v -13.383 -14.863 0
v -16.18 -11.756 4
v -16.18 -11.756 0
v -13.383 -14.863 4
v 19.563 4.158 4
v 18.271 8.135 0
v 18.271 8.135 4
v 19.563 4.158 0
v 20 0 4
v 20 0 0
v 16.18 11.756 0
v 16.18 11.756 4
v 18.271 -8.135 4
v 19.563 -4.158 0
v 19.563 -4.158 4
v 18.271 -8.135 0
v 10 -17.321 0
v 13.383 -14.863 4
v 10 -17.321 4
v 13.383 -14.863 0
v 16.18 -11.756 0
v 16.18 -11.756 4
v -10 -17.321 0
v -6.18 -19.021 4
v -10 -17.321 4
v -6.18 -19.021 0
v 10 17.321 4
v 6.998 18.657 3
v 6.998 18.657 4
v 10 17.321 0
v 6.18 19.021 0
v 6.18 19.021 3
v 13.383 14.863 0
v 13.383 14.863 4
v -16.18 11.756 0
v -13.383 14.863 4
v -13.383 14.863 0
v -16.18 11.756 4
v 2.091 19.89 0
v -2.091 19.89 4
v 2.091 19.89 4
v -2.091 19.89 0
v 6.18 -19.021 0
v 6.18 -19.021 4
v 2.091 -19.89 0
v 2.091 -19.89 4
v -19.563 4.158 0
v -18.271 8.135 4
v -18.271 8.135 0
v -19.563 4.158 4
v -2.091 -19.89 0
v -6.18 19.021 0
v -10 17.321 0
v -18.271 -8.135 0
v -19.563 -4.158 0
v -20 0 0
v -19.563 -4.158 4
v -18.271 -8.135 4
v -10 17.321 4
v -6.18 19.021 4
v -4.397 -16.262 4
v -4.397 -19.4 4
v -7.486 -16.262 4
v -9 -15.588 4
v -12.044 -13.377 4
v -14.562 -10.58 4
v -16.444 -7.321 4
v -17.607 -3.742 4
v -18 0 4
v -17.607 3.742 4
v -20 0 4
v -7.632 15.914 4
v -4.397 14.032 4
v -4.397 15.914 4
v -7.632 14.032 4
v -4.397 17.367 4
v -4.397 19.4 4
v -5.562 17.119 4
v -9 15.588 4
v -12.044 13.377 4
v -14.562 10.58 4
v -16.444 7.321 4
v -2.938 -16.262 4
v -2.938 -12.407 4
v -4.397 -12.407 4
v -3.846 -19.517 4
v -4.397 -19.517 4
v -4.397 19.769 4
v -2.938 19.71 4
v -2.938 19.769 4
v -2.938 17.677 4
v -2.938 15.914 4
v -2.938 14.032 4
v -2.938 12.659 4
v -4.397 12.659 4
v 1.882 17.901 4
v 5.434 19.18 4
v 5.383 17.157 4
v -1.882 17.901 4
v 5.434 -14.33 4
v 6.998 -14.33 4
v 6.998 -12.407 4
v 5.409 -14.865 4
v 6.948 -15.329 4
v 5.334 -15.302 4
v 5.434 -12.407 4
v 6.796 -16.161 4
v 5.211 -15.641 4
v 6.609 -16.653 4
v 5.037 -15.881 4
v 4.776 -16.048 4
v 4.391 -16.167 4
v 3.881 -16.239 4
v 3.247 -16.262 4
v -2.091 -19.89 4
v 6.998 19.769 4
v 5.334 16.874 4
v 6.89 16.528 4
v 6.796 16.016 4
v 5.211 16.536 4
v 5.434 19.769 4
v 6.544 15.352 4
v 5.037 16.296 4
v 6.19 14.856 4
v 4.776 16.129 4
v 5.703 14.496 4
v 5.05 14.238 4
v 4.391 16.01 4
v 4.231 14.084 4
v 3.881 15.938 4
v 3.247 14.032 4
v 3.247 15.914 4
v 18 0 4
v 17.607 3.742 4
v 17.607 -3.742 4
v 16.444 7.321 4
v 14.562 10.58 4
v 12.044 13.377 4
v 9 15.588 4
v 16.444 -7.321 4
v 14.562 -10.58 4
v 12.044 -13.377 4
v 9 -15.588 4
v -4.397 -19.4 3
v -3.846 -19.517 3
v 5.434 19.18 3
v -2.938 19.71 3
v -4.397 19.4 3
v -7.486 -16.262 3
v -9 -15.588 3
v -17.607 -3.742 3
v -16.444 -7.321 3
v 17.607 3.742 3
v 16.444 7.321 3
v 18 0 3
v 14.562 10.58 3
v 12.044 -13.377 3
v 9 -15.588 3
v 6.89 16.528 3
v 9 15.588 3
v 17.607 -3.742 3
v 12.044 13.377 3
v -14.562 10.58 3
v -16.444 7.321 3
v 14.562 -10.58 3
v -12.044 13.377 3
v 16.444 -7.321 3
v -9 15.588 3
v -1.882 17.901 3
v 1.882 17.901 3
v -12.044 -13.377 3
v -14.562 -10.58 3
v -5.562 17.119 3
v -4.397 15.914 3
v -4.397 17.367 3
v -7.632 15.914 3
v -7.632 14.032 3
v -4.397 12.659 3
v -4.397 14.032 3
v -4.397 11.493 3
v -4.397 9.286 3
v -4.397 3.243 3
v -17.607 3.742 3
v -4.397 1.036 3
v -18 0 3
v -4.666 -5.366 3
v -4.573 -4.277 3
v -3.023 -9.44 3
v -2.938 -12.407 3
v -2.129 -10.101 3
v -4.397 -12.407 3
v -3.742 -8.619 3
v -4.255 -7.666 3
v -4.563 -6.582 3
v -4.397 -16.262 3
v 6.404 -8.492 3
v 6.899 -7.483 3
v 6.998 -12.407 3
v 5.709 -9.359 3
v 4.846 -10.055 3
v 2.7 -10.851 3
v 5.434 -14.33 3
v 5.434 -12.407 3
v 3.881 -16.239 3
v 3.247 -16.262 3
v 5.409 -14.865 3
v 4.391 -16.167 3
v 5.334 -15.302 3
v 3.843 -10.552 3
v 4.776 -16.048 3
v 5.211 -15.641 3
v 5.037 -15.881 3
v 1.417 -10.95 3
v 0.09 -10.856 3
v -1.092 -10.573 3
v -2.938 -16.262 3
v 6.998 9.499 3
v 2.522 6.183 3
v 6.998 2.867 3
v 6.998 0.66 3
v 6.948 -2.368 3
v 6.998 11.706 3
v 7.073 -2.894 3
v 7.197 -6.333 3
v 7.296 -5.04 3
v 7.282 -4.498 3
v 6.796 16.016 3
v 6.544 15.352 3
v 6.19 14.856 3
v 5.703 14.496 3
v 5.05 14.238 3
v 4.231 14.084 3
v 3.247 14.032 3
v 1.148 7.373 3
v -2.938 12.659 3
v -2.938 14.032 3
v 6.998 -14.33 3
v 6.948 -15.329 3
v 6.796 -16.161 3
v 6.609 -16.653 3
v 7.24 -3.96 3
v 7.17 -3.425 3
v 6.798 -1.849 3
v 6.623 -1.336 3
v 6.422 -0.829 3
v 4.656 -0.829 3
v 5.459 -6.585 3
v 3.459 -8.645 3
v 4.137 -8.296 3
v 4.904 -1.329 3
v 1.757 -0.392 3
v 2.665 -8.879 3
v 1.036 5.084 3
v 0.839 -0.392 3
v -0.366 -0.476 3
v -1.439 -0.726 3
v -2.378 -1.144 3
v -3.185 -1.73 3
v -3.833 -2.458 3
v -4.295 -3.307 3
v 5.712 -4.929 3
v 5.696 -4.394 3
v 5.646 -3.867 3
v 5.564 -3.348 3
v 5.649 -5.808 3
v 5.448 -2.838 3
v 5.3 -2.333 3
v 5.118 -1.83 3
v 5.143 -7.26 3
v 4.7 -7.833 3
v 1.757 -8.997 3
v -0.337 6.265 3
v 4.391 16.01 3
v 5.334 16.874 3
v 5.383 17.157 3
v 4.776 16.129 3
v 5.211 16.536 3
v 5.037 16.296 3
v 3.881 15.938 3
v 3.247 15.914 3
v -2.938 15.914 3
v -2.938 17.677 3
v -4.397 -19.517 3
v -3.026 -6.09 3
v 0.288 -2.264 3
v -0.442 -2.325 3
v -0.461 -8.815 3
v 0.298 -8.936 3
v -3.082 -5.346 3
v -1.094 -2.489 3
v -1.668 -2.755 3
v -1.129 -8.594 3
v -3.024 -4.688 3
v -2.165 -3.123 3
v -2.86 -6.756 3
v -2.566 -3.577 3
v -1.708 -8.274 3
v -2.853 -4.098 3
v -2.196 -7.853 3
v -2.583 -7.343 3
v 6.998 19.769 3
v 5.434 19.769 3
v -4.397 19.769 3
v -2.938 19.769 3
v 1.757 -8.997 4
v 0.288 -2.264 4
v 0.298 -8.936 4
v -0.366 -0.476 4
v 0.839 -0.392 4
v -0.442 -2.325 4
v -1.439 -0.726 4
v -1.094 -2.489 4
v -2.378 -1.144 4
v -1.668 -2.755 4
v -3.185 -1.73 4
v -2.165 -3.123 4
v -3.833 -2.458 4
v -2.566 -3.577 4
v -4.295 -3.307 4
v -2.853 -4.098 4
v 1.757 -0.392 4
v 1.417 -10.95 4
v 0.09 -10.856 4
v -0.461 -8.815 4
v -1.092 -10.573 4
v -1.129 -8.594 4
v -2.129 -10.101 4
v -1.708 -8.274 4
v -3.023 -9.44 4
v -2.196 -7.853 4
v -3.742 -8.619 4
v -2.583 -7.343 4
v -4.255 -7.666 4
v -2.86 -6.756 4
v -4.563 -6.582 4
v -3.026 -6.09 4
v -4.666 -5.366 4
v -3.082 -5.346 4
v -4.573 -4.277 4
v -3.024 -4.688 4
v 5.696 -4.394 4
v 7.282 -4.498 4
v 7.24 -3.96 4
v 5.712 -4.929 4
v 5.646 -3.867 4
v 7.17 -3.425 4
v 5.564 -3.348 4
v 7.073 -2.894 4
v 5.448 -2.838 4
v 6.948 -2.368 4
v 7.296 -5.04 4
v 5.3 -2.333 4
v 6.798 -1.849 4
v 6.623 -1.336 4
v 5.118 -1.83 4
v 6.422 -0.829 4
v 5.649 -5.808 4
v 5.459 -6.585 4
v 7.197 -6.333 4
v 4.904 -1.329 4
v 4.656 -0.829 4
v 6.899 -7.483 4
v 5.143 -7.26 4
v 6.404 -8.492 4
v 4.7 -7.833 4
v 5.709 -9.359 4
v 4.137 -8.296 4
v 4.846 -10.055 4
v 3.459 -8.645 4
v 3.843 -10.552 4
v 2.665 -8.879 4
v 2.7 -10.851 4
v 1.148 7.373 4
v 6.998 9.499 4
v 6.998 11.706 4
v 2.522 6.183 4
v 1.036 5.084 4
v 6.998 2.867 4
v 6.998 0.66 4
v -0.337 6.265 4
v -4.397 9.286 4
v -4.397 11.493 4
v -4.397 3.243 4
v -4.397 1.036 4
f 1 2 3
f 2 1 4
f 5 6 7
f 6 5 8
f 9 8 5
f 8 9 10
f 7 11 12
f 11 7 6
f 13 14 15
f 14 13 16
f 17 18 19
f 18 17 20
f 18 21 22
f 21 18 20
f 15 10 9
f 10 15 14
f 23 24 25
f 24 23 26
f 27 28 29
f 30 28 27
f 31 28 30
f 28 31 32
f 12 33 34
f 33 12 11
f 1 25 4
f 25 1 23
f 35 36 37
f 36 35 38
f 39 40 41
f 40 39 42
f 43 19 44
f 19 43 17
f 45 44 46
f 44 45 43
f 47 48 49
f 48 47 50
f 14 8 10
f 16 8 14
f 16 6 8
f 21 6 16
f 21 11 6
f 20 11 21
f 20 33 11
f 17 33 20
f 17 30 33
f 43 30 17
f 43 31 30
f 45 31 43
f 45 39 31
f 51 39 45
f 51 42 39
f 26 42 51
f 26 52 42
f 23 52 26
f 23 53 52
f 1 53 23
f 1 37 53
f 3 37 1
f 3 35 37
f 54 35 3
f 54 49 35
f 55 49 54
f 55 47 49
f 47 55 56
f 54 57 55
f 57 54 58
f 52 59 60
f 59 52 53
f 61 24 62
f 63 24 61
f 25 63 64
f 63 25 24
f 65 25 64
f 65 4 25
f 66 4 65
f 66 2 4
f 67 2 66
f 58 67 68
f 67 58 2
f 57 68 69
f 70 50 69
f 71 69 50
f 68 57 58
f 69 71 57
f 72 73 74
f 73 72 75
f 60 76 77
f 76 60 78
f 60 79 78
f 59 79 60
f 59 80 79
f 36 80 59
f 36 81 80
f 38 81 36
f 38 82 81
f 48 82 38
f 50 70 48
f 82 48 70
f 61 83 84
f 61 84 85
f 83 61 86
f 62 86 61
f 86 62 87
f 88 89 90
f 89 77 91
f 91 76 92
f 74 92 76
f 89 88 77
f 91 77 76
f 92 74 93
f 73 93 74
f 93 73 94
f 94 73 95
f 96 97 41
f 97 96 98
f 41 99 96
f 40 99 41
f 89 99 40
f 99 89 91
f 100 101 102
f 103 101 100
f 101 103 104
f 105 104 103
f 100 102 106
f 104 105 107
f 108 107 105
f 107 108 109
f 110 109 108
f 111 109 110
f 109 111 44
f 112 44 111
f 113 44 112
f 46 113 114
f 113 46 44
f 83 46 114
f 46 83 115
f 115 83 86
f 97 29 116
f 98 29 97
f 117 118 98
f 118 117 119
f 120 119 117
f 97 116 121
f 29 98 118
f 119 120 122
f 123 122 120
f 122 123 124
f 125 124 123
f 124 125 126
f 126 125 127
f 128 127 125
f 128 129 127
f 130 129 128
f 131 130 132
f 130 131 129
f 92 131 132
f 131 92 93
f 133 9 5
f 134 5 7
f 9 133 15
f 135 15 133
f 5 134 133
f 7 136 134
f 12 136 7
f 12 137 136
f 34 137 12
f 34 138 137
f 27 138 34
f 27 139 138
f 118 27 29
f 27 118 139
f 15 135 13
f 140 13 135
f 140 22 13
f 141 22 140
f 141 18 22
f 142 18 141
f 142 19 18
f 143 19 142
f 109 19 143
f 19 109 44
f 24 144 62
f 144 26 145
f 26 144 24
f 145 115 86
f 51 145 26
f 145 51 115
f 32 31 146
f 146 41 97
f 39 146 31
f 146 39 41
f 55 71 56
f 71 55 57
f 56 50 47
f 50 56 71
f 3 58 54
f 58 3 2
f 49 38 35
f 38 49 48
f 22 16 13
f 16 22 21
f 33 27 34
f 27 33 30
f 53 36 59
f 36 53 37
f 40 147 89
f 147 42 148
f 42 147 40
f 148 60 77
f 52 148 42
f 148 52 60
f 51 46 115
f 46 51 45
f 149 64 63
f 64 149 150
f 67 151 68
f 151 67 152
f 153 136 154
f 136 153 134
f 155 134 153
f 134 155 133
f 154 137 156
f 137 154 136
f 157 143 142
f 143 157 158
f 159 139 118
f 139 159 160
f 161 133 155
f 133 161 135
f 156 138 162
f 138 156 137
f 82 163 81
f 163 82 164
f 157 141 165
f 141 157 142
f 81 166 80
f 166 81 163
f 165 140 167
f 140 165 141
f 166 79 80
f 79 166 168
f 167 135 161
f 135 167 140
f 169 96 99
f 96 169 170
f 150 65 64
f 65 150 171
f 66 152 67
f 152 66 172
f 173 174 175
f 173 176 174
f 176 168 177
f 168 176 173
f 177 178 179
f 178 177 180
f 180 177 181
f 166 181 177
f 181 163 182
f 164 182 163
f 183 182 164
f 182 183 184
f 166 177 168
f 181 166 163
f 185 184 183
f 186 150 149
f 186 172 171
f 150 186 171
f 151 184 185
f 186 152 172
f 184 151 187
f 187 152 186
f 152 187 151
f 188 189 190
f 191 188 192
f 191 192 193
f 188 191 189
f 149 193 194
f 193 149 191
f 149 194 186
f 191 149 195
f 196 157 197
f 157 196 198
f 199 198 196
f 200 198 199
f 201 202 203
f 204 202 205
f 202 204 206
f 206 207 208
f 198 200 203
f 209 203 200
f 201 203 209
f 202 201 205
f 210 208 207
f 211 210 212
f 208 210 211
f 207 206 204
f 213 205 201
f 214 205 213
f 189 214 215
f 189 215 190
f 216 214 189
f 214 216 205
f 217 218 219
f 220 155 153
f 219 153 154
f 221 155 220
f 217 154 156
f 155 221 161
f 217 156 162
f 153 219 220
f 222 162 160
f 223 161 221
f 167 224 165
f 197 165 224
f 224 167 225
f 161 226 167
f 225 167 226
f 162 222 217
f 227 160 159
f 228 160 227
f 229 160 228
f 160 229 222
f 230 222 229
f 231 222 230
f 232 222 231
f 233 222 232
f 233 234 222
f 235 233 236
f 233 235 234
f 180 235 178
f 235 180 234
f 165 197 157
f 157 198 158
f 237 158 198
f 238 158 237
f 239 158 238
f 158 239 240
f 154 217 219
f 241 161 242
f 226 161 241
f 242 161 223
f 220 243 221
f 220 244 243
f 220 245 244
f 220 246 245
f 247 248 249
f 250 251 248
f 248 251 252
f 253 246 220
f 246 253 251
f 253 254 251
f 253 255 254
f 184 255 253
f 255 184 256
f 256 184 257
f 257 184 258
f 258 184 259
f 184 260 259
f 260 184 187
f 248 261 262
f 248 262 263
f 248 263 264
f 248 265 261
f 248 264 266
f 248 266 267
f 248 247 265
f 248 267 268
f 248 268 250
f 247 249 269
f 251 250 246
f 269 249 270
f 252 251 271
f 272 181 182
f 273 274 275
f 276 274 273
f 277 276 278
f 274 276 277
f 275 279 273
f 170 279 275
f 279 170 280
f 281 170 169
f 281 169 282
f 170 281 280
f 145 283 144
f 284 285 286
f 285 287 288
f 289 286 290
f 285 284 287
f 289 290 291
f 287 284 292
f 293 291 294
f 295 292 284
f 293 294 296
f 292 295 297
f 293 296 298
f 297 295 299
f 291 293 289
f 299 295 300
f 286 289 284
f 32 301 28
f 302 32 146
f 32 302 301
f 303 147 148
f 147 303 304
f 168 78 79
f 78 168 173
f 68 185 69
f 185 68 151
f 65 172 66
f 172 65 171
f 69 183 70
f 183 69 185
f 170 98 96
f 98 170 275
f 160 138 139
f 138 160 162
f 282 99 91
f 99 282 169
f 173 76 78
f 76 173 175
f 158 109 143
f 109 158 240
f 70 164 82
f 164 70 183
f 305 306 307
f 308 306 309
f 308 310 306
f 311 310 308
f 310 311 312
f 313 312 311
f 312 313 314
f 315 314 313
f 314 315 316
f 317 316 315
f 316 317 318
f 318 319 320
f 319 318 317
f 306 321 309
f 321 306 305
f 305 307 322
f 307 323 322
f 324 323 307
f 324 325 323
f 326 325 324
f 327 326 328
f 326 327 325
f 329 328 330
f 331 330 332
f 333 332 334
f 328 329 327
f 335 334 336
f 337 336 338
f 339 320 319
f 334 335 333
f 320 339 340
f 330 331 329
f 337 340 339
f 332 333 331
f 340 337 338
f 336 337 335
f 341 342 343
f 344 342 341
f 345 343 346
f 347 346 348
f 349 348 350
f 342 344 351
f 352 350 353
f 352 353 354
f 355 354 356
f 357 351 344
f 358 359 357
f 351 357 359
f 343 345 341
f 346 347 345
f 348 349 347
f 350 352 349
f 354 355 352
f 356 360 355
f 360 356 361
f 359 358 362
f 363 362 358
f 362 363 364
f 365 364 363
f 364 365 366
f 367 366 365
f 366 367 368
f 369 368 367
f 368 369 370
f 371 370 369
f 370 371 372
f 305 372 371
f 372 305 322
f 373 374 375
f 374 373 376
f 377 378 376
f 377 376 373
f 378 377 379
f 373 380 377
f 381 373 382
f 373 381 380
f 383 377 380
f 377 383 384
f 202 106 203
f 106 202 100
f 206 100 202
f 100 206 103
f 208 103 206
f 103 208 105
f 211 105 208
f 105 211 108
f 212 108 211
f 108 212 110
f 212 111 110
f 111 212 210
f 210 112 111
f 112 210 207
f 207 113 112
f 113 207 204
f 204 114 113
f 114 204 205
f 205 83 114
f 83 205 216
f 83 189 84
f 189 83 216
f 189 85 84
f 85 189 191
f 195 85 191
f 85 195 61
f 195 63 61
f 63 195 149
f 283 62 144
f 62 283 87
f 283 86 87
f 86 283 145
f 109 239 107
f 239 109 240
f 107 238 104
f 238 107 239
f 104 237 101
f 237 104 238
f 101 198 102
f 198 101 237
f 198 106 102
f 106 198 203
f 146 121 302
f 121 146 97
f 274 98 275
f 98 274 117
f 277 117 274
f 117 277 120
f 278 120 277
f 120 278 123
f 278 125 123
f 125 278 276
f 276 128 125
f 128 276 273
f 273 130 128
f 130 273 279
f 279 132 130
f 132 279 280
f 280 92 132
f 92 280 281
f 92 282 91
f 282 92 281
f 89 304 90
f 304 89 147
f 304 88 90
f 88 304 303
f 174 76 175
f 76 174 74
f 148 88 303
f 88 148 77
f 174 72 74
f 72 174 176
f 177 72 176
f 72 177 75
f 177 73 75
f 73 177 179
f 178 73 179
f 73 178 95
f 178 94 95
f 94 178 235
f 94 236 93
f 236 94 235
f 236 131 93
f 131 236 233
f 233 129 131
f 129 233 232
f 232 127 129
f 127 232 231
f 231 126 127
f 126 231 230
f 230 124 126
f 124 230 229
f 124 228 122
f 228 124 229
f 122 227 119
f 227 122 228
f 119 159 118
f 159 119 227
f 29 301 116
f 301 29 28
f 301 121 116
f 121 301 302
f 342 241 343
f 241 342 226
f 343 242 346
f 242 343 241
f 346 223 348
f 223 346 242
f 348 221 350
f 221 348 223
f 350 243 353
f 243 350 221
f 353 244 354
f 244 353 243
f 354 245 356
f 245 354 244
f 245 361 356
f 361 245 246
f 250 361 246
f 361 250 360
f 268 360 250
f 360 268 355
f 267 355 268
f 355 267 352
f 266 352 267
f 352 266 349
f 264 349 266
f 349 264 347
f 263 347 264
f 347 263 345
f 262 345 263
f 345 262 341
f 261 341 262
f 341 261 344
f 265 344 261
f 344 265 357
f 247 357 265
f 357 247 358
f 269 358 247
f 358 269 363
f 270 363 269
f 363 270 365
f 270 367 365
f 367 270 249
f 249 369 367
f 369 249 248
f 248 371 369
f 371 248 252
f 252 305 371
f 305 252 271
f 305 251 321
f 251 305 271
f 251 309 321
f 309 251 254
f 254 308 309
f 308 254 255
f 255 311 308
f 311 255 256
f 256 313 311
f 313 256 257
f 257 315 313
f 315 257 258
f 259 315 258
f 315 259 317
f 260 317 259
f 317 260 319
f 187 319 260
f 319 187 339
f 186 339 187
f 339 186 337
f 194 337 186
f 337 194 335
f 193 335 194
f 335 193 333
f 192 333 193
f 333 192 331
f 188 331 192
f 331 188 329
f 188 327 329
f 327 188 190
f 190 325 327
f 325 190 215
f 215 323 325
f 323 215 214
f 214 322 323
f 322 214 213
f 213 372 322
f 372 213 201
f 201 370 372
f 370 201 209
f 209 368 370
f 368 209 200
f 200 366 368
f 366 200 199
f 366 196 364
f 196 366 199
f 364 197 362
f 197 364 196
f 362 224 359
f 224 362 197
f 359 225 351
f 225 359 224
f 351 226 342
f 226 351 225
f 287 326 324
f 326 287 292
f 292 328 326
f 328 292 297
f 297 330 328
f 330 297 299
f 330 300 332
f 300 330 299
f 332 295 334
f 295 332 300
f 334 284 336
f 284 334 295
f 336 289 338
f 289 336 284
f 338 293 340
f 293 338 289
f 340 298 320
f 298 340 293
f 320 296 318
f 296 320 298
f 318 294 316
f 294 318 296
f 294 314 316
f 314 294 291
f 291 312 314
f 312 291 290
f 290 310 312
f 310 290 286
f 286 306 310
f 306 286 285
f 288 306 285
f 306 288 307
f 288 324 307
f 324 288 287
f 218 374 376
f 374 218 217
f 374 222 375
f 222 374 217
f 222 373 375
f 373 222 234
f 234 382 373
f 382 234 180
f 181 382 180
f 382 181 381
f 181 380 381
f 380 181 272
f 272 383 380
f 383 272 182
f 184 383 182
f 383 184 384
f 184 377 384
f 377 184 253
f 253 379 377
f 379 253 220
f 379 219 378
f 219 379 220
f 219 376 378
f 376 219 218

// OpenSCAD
//Customizable Double Sided Token

/*Token Variables*/
token_width = 40;
token_rim_size = 4;
token_thickness = 4;
token_recess = 1;

/*Text Varibles*/
font = "Impact";
letter_size = 15;
letter_height = 1;
letter_text = "text";

x=0;
y=0;


module void() {}




difference() {
    
    //create token
    cylinder(h=token_thickness, d=token_width);

     //recess top
    translate([0,0,token_thickness-token_recess]){
        color("blue") cylinder(h=token_thickness+token_recess, d=token_width-token_rim_size);
       
    }


    
}


union() {
    color("red")
    translate([x,y,(token_thickness-token_recess)]){
        linear_extrude(height = letter_height){
            rotate([0,0,90]) translate([0,0,5]) text(letter_text, font=font, valign="center", halign="center", size=letter_size);
        }
    }
}
        
